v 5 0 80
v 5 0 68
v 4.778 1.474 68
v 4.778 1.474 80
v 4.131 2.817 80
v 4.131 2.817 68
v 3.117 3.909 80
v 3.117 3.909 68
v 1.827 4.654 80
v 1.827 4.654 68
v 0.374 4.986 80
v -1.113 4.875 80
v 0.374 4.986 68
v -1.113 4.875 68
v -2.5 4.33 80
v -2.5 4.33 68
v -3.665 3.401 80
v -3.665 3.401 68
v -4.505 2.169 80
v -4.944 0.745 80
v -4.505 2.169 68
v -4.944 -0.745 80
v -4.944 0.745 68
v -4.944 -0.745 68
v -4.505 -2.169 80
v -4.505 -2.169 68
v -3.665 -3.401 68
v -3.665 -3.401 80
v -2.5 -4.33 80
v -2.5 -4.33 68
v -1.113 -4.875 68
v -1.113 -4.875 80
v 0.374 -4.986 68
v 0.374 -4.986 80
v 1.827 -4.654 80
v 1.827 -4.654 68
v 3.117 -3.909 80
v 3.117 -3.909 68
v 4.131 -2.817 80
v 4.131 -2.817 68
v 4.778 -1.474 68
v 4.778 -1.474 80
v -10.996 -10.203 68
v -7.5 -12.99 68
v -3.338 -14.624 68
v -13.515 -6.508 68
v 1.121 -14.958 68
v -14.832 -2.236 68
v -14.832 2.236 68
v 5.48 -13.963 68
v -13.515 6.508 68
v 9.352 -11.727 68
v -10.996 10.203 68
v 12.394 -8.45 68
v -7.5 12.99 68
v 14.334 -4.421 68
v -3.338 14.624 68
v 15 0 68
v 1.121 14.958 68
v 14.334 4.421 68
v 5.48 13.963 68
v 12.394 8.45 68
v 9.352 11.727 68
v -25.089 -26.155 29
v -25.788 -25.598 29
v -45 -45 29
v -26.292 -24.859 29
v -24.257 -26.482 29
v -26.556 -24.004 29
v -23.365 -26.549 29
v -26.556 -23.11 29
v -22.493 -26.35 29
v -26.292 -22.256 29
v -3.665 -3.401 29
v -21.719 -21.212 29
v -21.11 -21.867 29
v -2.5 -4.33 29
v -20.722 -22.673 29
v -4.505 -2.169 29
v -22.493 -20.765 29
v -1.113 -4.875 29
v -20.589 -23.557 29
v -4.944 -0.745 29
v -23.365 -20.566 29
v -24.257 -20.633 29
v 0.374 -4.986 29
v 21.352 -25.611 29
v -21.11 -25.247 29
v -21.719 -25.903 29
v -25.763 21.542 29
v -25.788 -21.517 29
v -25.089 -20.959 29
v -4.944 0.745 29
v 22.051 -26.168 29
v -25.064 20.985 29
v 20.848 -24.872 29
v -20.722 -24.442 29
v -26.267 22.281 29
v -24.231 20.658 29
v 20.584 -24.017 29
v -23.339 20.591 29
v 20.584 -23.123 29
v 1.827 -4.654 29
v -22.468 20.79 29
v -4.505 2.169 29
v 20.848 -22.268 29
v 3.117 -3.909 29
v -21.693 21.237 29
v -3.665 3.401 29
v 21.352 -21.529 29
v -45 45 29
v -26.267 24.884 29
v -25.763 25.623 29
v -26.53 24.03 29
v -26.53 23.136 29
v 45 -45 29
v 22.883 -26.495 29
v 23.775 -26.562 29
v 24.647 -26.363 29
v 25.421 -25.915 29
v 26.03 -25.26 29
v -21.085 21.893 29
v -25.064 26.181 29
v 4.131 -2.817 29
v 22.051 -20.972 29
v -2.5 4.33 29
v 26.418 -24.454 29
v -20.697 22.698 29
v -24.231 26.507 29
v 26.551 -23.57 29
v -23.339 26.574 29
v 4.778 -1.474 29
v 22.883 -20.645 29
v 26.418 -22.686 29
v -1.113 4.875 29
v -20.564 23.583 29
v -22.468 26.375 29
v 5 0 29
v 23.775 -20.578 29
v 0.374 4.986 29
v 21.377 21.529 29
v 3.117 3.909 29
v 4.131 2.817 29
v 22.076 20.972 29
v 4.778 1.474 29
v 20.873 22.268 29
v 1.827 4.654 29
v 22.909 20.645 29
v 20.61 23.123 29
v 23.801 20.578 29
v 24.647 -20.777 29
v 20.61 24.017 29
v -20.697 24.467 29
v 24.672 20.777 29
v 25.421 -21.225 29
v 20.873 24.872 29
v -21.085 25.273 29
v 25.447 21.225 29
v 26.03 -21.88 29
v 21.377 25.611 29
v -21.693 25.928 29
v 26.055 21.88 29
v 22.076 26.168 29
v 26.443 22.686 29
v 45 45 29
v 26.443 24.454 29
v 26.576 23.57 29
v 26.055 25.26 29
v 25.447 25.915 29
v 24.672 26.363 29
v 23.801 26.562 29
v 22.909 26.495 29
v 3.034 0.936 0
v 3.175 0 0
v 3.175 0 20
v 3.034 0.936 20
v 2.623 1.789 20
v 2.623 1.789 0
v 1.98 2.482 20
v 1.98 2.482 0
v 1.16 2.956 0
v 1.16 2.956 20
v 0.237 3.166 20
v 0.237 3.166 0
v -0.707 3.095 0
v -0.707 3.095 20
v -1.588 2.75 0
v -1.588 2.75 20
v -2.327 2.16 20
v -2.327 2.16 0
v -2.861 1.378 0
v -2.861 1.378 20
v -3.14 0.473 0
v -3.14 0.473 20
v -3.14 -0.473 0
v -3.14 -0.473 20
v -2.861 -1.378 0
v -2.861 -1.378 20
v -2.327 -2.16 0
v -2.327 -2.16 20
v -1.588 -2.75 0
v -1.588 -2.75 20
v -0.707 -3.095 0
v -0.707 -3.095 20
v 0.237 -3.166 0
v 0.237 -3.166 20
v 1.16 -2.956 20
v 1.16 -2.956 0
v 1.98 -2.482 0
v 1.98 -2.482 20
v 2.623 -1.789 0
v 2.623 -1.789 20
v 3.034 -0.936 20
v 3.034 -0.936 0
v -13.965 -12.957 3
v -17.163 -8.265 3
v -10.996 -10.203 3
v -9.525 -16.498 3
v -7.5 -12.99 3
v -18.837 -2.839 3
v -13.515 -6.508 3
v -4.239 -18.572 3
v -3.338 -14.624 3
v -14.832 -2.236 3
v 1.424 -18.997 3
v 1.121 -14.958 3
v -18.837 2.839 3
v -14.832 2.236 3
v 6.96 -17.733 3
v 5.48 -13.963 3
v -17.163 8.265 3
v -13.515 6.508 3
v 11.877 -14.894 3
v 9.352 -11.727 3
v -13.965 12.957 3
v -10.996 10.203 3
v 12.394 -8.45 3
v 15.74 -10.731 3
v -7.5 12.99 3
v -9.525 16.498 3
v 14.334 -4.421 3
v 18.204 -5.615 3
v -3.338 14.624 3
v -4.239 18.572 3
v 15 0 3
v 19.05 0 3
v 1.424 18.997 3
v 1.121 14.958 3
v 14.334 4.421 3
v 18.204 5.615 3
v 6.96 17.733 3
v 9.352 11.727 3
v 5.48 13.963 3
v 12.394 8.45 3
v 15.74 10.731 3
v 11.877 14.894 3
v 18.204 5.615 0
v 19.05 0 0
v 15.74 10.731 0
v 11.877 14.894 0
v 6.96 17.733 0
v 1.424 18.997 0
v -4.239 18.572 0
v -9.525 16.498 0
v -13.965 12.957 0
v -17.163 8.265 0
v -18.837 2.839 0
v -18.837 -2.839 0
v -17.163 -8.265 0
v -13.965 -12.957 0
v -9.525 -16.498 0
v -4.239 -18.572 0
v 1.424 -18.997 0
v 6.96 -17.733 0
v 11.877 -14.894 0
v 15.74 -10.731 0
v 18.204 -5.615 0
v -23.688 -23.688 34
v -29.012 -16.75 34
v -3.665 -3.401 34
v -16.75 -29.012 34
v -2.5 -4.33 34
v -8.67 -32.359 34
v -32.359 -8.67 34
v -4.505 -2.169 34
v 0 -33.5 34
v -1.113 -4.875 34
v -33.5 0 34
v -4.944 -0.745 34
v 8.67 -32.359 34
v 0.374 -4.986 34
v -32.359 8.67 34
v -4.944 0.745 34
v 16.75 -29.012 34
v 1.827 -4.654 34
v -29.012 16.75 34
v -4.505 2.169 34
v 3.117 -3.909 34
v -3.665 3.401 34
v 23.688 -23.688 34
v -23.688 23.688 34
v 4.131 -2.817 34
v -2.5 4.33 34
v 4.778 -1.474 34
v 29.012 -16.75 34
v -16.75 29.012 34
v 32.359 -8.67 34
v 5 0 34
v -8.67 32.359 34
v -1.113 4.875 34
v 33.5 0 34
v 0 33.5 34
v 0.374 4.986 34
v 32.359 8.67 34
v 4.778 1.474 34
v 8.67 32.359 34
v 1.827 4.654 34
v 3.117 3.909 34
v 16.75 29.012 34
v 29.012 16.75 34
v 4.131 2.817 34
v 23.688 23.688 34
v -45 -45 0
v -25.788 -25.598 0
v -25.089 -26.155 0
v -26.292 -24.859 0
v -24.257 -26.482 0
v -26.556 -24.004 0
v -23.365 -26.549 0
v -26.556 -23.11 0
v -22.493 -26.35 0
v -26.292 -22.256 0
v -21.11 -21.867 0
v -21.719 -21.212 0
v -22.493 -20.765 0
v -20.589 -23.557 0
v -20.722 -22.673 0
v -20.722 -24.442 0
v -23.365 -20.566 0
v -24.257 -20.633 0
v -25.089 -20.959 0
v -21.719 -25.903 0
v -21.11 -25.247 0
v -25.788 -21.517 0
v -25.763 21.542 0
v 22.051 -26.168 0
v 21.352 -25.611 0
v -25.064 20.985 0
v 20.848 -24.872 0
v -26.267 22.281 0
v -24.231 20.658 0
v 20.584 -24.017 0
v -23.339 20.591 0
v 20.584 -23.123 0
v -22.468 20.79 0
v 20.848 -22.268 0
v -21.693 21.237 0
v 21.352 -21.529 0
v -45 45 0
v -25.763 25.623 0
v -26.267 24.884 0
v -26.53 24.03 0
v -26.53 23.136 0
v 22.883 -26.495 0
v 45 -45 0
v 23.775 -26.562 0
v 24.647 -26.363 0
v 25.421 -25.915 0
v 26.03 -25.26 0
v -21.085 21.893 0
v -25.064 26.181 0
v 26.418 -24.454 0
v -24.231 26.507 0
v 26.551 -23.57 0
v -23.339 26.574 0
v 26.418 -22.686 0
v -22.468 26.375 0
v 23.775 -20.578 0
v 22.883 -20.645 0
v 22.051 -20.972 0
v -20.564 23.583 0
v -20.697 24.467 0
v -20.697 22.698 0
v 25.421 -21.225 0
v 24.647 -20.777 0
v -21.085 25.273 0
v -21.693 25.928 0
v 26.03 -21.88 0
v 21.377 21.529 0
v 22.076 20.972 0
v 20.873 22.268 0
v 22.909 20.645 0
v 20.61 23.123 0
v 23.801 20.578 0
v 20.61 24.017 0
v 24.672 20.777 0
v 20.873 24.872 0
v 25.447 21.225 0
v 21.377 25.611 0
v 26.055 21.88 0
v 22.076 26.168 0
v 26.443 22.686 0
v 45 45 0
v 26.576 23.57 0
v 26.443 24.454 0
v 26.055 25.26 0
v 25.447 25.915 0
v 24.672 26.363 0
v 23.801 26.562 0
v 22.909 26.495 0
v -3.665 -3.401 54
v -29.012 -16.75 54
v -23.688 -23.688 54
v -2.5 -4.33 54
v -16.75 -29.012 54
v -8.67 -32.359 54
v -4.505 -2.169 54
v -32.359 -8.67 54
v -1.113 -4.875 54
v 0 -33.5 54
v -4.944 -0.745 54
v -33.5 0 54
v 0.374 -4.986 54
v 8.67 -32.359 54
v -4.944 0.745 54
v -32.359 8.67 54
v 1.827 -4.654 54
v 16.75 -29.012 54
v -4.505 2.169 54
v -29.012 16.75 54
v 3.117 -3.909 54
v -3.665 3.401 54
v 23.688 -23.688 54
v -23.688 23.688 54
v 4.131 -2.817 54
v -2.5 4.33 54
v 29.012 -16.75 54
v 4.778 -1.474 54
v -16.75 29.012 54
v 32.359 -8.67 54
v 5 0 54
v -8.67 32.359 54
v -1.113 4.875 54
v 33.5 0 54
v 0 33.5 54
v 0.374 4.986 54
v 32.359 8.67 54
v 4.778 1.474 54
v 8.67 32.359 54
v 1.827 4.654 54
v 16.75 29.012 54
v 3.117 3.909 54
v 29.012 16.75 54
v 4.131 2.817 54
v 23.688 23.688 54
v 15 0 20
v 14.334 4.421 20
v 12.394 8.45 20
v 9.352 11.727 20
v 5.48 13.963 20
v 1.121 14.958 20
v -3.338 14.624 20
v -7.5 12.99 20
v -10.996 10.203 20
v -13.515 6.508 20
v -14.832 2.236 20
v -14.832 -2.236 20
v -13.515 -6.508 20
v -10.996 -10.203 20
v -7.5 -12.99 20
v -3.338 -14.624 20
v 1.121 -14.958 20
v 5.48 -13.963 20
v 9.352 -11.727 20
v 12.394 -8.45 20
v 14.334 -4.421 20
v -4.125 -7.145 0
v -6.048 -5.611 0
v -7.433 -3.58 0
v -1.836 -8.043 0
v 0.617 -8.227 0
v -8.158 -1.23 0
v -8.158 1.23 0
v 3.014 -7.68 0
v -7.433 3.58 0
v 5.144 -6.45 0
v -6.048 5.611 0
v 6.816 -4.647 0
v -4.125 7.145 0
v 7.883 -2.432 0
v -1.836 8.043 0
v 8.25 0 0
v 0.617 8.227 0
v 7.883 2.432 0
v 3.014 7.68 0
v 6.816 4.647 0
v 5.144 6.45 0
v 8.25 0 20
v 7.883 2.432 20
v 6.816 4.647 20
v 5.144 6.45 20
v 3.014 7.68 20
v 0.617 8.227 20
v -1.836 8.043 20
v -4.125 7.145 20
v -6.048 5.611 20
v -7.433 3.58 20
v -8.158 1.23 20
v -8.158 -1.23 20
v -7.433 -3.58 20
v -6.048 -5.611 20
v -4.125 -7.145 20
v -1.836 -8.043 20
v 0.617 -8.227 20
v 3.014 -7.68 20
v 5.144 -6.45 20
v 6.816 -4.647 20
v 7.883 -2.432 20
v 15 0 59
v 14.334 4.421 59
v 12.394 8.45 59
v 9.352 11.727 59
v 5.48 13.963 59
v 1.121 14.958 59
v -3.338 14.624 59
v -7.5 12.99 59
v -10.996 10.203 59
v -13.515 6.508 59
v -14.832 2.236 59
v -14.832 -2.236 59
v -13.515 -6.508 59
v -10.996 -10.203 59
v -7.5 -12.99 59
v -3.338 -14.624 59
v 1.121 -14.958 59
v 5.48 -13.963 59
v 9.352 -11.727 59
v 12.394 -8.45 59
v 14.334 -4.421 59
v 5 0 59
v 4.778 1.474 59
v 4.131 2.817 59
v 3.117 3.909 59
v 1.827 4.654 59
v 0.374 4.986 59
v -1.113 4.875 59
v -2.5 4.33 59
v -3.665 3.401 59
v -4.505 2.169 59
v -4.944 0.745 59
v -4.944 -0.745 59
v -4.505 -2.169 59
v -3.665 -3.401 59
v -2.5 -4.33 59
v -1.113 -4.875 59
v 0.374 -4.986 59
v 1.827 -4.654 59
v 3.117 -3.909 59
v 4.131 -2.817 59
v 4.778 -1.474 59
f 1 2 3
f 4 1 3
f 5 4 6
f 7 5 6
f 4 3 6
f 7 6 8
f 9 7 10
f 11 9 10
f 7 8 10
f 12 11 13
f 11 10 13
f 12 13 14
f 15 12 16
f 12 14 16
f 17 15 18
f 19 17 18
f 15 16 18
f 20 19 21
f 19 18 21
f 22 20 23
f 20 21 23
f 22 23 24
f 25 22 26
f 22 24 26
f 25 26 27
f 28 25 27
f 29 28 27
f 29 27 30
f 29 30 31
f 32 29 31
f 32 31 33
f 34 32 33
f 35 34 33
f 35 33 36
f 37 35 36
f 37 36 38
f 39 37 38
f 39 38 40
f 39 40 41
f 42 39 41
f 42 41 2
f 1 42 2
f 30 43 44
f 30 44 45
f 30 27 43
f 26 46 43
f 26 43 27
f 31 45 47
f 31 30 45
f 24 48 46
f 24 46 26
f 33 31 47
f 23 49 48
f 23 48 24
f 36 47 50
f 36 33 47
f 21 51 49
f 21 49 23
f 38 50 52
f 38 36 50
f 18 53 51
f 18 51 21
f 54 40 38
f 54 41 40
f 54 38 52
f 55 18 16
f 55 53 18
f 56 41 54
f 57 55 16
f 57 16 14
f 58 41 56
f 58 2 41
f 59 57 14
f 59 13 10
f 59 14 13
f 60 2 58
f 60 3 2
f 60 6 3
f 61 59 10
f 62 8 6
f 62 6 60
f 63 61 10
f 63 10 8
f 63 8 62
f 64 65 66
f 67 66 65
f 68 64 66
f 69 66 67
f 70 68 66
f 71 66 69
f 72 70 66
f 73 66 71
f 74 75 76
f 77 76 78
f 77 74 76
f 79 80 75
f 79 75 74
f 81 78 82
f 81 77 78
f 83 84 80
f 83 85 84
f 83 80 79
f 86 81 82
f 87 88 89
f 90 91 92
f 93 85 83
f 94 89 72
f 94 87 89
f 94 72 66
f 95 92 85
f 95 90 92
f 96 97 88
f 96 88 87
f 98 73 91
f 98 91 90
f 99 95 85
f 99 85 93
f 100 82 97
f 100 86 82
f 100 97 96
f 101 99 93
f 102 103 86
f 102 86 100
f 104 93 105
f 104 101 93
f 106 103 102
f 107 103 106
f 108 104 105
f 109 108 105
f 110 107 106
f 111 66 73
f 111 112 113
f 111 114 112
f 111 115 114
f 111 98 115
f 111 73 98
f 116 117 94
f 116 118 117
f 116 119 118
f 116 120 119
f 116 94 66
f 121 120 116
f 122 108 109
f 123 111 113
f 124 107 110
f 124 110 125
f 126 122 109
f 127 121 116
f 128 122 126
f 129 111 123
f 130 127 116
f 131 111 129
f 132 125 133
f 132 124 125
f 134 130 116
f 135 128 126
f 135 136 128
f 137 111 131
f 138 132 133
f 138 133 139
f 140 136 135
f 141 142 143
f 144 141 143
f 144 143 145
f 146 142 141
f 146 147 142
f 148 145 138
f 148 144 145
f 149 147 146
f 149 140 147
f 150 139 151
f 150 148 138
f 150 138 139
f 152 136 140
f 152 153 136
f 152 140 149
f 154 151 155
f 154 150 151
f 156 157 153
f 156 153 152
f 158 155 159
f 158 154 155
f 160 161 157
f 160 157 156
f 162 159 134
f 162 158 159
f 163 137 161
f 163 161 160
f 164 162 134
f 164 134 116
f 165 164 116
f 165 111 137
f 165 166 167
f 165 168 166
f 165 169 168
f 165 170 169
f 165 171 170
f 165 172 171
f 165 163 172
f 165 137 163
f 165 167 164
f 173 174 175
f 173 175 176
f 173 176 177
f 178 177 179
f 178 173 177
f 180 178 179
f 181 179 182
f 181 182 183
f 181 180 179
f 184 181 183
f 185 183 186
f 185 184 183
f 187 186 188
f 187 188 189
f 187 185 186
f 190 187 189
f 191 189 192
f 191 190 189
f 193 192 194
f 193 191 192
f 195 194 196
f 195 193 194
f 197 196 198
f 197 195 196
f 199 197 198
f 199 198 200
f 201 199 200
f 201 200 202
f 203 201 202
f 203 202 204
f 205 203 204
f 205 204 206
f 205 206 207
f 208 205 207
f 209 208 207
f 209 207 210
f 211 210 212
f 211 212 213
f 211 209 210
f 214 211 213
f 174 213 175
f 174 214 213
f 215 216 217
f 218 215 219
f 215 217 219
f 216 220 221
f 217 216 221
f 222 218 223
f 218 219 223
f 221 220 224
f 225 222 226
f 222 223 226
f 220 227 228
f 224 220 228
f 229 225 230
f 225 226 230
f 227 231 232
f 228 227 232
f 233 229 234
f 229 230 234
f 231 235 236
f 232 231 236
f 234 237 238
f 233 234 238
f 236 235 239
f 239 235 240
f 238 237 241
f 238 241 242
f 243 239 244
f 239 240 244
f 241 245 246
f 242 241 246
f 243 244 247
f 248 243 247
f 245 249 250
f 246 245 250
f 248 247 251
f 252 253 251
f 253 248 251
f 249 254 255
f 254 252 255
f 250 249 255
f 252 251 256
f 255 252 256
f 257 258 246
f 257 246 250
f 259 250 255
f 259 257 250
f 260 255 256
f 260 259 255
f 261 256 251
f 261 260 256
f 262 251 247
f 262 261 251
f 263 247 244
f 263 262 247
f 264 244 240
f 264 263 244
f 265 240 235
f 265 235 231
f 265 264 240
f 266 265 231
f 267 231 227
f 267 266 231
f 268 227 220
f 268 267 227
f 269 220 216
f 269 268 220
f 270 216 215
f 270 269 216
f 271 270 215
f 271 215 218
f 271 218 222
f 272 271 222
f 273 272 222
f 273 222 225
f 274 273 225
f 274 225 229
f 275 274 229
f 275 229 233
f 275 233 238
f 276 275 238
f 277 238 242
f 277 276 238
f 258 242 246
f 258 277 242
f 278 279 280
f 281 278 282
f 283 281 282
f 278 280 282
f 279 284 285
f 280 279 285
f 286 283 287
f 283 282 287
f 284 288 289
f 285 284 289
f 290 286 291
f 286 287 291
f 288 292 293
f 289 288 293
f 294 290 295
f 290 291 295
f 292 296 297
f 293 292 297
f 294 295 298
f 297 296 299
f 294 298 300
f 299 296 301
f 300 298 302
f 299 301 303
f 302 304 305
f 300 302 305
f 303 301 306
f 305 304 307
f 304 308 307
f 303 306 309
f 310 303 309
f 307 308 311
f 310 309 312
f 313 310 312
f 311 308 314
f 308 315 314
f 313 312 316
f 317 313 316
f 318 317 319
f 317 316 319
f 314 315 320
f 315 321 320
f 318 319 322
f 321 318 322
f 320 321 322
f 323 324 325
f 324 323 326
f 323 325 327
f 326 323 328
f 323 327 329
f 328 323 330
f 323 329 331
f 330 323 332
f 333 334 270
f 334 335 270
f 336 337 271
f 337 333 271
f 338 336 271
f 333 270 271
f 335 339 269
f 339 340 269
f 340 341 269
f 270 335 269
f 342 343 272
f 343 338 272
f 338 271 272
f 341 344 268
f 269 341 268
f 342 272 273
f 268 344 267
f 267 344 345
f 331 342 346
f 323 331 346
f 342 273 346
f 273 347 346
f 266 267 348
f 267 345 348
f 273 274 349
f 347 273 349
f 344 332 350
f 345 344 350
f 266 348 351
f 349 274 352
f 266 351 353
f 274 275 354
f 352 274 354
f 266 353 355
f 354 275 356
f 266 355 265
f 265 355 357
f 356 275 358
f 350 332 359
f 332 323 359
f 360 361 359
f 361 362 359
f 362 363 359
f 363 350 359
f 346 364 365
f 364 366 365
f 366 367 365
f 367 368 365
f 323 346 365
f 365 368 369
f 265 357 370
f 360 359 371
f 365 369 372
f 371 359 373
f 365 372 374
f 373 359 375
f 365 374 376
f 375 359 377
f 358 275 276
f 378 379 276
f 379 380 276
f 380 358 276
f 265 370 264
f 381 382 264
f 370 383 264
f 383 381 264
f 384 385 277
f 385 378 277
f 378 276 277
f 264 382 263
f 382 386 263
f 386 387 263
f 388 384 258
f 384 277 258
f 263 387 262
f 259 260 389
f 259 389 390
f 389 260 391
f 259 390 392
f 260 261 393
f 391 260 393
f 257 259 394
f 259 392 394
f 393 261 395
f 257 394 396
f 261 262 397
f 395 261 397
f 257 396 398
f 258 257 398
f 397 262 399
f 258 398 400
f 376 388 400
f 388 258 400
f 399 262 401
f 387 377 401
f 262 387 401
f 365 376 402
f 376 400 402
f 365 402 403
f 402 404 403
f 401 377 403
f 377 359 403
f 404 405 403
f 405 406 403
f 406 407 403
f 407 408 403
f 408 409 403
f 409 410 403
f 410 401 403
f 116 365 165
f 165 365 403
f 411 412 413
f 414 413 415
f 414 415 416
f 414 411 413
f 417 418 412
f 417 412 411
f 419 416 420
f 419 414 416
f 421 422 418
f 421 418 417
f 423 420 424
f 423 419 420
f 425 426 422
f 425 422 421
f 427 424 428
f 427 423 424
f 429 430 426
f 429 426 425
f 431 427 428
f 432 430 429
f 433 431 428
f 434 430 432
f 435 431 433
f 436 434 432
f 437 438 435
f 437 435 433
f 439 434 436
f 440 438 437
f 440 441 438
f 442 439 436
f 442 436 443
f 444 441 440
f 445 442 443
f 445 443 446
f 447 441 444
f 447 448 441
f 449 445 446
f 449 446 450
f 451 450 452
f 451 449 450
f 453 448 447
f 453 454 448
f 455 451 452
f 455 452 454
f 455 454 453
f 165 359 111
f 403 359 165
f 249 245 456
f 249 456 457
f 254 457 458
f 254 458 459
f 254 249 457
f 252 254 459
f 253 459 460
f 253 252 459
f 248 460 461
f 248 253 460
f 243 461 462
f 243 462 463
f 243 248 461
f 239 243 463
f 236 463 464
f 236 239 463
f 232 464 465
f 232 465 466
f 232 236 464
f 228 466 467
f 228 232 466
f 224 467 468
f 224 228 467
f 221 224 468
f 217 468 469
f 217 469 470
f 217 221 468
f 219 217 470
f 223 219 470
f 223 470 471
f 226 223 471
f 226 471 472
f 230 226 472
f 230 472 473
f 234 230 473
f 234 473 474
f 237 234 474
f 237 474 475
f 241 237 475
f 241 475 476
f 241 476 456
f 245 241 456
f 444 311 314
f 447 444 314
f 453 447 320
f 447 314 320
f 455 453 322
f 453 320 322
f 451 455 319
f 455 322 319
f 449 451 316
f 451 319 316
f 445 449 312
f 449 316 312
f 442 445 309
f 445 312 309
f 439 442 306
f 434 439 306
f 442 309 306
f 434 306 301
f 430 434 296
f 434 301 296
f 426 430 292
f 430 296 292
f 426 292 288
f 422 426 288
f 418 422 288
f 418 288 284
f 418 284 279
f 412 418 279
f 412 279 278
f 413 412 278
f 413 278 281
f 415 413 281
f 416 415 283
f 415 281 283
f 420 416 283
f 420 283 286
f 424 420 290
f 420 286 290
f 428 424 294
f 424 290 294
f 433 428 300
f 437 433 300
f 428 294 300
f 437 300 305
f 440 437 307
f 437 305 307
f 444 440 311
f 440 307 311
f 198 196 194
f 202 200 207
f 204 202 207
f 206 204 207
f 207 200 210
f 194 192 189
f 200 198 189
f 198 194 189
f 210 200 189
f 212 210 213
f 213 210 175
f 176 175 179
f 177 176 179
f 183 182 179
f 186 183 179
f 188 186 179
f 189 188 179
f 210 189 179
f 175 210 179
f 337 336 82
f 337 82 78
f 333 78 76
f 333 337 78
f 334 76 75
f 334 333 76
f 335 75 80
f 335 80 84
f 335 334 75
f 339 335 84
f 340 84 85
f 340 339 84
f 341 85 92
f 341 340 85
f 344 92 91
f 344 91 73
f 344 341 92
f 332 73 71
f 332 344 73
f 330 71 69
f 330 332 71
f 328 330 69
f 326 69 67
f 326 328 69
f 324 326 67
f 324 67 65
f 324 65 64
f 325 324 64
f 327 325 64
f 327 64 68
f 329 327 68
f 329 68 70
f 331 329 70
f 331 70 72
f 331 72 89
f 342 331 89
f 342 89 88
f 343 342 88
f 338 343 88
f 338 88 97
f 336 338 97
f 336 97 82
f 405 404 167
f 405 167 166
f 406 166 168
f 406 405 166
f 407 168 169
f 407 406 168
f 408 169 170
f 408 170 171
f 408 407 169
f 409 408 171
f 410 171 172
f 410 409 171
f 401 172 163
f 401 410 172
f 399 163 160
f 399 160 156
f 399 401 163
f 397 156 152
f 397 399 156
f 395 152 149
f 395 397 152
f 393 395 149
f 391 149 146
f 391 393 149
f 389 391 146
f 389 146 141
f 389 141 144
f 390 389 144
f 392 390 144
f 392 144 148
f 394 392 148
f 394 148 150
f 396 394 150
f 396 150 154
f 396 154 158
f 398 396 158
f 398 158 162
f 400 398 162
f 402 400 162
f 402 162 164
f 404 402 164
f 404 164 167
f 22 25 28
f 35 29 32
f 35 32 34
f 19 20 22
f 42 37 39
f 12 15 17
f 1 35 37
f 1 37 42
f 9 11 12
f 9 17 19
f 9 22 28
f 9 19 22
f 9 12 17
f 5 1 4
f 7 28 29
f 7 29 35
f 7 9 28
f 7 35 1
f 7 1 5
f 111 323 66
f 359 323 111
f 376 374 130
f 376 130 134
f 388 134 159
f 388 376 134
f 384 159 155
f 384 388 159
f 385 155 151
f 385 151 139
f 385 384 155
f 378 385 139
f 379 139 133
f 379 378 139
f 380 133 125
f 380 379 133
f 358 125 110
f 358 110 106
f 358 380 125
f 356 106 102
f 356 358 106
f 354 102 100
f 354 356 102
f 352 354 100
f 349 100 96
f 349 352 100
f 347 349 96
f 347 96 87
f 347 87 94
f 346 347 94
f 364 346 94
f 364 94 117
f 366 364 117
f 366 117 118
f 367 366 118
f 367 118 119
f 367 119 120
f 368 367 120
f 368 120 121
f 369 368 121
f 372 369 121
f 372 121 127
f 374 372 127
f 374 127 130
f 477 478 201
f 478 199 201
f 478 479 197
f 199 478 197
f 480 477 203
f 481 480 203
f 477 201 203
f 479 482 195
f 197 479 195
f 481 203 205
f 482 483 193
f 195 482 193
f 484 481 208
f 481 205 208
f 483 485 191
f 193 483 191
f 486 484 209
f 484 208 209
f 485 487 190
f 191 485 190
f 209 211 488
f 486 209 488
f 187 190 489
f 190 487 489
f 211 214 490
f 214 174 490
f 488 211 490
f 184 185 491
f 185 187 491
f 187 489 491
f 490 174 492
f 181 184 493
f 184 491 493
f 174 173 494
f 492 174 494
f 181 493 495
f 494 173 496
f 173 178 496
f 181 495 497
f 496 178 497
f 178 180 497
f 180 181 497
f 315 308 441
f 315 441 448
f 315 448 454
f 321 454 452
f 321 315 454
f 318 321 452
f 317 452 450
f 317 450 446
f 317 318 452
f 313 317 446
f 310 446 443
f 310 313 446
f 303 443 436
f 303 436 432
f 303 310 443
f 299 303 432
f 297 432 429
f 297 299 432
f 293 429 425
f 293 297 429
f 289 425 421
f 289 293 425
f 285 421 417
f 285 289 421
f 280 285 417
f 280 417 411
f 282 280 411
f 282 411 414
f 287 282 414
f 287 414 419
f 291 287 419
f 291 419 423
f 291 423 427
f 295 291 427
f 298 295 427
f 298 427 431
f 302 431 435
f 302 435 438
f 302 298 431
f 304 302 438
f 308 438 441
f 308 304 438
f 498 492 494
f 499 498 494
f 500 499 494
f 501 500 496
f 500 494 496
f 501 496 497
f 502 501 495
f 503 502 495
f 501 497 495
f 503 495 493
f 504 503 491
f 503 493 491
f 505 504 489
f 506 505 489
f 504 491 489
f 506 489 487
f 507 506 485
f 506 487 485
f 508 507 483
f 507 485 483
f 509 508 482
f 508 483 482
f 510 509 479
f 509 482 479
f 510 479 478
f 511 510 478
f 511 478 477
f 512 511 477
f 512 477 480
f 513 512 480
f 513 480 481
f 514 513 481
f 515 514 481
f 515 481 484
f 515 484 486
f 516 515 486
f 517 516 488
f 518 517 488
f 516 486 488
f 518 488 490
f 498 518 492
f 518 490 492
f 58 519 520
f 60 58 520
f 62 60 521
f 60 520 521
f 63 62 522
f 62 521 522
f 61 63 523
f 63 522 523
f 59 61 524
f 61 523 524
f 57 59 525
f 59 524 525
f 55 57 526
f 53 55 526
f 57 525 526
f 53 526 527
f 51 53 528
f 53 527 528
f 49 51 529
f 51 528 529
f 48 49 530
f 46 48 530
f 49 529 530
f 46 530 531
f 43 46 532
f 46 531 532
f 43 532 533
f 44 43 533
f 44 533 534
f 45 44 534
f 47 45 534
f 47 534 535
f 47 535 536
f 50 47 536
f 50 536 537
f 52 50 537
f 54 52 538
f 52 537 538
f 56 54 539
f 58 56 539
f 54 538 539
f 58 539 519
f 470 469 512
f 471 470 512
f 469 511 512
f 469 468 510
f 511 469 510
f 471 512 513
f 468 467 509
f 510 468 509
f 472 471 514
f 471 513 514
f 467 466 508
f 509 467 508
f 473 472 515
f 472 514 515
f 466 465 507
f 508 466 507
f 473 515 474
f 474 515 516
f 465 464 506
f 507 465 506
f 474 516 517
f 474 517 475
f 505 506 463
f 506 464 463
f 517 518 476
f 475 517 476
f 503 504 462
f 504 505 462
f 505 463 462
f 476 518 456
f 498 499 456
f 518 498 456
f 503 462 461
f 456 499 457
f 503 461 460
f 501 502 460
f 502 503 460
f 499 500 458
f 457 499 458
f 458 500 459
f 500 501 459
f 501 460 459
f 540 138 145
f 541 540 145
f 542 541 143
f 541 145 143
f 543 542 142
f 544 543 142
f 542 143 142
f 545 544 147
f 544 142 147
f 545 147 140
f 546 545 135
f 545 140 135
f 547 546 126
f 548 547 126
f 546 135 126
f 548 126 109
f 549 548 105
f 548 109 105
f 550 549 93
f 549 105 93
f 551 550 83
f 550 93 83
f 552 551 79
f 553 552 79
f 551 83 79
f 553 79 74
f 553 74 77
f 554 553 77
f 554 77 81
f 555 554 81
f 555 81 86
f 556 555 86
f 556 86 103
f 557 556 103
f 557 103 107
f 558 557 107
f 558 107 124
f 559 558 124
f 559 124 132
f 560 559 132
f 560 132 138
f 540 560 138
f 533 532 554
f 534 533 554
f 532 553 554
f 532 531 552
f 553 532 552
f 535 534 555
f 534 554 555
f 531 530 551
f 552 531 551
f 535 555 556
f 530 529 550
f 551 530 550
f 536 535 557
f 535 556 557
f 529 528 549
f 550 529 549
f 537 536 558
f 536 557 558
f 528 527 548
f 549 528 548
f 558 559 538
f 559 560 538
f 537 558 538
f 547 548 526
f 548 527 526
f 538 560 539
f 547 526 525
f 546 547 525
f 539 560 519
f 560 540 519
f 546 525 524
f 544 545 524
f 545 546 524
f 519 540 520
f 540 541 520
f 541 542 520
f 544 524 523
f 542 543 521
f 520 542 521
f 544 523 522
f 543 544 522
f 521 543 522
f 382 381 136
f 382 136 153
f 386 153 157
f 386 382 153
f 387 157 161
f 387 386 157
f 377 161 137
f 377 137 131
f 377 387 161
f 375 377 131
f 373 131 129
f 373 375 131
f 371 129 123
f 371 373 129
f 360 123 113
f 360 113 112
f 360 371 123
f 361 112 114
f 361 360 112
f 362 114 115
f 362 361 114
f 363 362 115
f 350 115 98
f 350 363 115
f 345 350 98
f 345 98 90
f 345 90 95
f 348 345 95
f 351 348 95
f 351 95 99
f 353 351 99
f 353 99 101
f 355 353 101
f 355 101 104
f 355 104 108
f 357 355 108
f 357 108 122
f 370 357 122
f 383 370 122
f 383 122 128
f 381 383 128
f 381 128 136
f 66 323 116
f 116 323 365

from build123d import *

# Parameters (mm, degrees)
F2_R        = 8.25
F2_R_2      = 5
F2_R_3      = 3.175
F3_DEPTH    = 20
F4_START    = 20
F4_DEPTH    = 60
F6_START    = 20
F5_R        = 15
F5_R_2      = 5
F6_DEPTH    = 9
F7_START    = 30
F6_FACE_R   = 15
F6_FACE_R_2 = 5
F7_DEPTH    = 9
F9_START    = 34
F8_R        = 33.5
F8_R_2      = 5
F9_DEPTH    = 20
F10_START   = 3
F1_W        = 90
F1_H        = 90
F1_R        = 3
F1_R_2      = 19.05
F1_R_3      = 15
F10_DEPTH   = 26
F11_DEPTH   = 3


with BuildPart() as f3:
    # F2 (on Top) → F3 (new body)
    with BuildSketch(Plane.XY):
        Circle(F2_R)
        Circle(F2_R_2, mode=Mode.SUBTRACT)
        Circle(F2_R_2)
        Circle(F2_R_3, mode=Mode.SUBTRACT)
    extrude(amount=F3_DEPTH)

    # F2 (on Top) → F4 (join)
    with BuildSketch(Plane.XY.offset(F4_START)):
        Circle(F2_R_2)
        Circle(F2_R_3, mode=Mode.SUBTRACT)
        Circle(F2_R_3)
    extrude(amount=F4_DEPTH)

    # F5 (on Top) → F6 (join)
    with BuildSketch(Plane.XY.offset(F6_START)):
        Circle(F5_R)
        Circle(F5_R_2, mode=Mode.SUBTRACT)
    extrude(amount=F6_DEPTH)

    # F6_face (on face) → F7 (join)
    with BuildSketch(Plane.XY.offset(29).offset(F7_START)):
        Circle(F6_FACE_R)
        Circle(F6_FACE_R_2, mode=Mode.SUBTRACT)
    extrude(amount=F7_DEPTH)

    # F1 (on Top) → F10 (join)
    with BuildSketch(Plane.XY.offset(F10_START)):
        Rectangle(F1_W, F1_H)
        with Locations((-23.5890189799, -23.5573149959)):
            Circle(F1_R, mode=Mode.SUBTRACT)
        with Locations((23.5509810201, -23.57)):
            Circle(F1_R, mode=Mode.SUBTRACT)
        with Locations((-23.5636557912, 23.5826850041)):
            Circle(F1_R, mode=Mode.SUBTRACT)
        Circle(F1_R_2, mode=Mode.SUBTRACT)
        with Locations((23.5763442088, 23.57)):
            Circle(F1_R, mode=Mode.SUBTRACT)
        Circle(F1_R_2)
        Circle(F1_R_3, mode=Mode.SUBTRACT)
    extrude(amount=F10_DEPTH)

    # F1 (on Top) → F11 (join)
    with BuildSketch(Plane.XY):
        Rectangle(F1_W, F1_H)
        with Locations((-23.5890189799, -23.5573149959)):
            Circle(F1_R, mode=Mode.SUBTRACT)
        with Locations((23.5509810201, -23.57)):
            Circle(F1_R, mode=Mode.SUBTRACT)
        with Locations((-23.5636557912, 23.5826850041)):
            Circle(F1_R, mode=Mode.SUBTRACT)
        Circle(F1_R_2, mode=Mode.SUBTRACT)
        with Locations((23.5763442088, 23.57)):
            Circle(F1_R, mode=Mode.SUBTRACT)
    extrude(amount=F11_DEPTH)


with BuildPart() as f9:
    # F8 (on Top) → F9 (new body)
    with BuildSketch(Plane.XY.offset(F9_START)):
        Circle(F8_R)
        Circle(F8_R_2, mode=Mode.SUBTRACT)
    extrude(amount=F9_DEPTH)


solid = Compound([f3.part, f9.part])
